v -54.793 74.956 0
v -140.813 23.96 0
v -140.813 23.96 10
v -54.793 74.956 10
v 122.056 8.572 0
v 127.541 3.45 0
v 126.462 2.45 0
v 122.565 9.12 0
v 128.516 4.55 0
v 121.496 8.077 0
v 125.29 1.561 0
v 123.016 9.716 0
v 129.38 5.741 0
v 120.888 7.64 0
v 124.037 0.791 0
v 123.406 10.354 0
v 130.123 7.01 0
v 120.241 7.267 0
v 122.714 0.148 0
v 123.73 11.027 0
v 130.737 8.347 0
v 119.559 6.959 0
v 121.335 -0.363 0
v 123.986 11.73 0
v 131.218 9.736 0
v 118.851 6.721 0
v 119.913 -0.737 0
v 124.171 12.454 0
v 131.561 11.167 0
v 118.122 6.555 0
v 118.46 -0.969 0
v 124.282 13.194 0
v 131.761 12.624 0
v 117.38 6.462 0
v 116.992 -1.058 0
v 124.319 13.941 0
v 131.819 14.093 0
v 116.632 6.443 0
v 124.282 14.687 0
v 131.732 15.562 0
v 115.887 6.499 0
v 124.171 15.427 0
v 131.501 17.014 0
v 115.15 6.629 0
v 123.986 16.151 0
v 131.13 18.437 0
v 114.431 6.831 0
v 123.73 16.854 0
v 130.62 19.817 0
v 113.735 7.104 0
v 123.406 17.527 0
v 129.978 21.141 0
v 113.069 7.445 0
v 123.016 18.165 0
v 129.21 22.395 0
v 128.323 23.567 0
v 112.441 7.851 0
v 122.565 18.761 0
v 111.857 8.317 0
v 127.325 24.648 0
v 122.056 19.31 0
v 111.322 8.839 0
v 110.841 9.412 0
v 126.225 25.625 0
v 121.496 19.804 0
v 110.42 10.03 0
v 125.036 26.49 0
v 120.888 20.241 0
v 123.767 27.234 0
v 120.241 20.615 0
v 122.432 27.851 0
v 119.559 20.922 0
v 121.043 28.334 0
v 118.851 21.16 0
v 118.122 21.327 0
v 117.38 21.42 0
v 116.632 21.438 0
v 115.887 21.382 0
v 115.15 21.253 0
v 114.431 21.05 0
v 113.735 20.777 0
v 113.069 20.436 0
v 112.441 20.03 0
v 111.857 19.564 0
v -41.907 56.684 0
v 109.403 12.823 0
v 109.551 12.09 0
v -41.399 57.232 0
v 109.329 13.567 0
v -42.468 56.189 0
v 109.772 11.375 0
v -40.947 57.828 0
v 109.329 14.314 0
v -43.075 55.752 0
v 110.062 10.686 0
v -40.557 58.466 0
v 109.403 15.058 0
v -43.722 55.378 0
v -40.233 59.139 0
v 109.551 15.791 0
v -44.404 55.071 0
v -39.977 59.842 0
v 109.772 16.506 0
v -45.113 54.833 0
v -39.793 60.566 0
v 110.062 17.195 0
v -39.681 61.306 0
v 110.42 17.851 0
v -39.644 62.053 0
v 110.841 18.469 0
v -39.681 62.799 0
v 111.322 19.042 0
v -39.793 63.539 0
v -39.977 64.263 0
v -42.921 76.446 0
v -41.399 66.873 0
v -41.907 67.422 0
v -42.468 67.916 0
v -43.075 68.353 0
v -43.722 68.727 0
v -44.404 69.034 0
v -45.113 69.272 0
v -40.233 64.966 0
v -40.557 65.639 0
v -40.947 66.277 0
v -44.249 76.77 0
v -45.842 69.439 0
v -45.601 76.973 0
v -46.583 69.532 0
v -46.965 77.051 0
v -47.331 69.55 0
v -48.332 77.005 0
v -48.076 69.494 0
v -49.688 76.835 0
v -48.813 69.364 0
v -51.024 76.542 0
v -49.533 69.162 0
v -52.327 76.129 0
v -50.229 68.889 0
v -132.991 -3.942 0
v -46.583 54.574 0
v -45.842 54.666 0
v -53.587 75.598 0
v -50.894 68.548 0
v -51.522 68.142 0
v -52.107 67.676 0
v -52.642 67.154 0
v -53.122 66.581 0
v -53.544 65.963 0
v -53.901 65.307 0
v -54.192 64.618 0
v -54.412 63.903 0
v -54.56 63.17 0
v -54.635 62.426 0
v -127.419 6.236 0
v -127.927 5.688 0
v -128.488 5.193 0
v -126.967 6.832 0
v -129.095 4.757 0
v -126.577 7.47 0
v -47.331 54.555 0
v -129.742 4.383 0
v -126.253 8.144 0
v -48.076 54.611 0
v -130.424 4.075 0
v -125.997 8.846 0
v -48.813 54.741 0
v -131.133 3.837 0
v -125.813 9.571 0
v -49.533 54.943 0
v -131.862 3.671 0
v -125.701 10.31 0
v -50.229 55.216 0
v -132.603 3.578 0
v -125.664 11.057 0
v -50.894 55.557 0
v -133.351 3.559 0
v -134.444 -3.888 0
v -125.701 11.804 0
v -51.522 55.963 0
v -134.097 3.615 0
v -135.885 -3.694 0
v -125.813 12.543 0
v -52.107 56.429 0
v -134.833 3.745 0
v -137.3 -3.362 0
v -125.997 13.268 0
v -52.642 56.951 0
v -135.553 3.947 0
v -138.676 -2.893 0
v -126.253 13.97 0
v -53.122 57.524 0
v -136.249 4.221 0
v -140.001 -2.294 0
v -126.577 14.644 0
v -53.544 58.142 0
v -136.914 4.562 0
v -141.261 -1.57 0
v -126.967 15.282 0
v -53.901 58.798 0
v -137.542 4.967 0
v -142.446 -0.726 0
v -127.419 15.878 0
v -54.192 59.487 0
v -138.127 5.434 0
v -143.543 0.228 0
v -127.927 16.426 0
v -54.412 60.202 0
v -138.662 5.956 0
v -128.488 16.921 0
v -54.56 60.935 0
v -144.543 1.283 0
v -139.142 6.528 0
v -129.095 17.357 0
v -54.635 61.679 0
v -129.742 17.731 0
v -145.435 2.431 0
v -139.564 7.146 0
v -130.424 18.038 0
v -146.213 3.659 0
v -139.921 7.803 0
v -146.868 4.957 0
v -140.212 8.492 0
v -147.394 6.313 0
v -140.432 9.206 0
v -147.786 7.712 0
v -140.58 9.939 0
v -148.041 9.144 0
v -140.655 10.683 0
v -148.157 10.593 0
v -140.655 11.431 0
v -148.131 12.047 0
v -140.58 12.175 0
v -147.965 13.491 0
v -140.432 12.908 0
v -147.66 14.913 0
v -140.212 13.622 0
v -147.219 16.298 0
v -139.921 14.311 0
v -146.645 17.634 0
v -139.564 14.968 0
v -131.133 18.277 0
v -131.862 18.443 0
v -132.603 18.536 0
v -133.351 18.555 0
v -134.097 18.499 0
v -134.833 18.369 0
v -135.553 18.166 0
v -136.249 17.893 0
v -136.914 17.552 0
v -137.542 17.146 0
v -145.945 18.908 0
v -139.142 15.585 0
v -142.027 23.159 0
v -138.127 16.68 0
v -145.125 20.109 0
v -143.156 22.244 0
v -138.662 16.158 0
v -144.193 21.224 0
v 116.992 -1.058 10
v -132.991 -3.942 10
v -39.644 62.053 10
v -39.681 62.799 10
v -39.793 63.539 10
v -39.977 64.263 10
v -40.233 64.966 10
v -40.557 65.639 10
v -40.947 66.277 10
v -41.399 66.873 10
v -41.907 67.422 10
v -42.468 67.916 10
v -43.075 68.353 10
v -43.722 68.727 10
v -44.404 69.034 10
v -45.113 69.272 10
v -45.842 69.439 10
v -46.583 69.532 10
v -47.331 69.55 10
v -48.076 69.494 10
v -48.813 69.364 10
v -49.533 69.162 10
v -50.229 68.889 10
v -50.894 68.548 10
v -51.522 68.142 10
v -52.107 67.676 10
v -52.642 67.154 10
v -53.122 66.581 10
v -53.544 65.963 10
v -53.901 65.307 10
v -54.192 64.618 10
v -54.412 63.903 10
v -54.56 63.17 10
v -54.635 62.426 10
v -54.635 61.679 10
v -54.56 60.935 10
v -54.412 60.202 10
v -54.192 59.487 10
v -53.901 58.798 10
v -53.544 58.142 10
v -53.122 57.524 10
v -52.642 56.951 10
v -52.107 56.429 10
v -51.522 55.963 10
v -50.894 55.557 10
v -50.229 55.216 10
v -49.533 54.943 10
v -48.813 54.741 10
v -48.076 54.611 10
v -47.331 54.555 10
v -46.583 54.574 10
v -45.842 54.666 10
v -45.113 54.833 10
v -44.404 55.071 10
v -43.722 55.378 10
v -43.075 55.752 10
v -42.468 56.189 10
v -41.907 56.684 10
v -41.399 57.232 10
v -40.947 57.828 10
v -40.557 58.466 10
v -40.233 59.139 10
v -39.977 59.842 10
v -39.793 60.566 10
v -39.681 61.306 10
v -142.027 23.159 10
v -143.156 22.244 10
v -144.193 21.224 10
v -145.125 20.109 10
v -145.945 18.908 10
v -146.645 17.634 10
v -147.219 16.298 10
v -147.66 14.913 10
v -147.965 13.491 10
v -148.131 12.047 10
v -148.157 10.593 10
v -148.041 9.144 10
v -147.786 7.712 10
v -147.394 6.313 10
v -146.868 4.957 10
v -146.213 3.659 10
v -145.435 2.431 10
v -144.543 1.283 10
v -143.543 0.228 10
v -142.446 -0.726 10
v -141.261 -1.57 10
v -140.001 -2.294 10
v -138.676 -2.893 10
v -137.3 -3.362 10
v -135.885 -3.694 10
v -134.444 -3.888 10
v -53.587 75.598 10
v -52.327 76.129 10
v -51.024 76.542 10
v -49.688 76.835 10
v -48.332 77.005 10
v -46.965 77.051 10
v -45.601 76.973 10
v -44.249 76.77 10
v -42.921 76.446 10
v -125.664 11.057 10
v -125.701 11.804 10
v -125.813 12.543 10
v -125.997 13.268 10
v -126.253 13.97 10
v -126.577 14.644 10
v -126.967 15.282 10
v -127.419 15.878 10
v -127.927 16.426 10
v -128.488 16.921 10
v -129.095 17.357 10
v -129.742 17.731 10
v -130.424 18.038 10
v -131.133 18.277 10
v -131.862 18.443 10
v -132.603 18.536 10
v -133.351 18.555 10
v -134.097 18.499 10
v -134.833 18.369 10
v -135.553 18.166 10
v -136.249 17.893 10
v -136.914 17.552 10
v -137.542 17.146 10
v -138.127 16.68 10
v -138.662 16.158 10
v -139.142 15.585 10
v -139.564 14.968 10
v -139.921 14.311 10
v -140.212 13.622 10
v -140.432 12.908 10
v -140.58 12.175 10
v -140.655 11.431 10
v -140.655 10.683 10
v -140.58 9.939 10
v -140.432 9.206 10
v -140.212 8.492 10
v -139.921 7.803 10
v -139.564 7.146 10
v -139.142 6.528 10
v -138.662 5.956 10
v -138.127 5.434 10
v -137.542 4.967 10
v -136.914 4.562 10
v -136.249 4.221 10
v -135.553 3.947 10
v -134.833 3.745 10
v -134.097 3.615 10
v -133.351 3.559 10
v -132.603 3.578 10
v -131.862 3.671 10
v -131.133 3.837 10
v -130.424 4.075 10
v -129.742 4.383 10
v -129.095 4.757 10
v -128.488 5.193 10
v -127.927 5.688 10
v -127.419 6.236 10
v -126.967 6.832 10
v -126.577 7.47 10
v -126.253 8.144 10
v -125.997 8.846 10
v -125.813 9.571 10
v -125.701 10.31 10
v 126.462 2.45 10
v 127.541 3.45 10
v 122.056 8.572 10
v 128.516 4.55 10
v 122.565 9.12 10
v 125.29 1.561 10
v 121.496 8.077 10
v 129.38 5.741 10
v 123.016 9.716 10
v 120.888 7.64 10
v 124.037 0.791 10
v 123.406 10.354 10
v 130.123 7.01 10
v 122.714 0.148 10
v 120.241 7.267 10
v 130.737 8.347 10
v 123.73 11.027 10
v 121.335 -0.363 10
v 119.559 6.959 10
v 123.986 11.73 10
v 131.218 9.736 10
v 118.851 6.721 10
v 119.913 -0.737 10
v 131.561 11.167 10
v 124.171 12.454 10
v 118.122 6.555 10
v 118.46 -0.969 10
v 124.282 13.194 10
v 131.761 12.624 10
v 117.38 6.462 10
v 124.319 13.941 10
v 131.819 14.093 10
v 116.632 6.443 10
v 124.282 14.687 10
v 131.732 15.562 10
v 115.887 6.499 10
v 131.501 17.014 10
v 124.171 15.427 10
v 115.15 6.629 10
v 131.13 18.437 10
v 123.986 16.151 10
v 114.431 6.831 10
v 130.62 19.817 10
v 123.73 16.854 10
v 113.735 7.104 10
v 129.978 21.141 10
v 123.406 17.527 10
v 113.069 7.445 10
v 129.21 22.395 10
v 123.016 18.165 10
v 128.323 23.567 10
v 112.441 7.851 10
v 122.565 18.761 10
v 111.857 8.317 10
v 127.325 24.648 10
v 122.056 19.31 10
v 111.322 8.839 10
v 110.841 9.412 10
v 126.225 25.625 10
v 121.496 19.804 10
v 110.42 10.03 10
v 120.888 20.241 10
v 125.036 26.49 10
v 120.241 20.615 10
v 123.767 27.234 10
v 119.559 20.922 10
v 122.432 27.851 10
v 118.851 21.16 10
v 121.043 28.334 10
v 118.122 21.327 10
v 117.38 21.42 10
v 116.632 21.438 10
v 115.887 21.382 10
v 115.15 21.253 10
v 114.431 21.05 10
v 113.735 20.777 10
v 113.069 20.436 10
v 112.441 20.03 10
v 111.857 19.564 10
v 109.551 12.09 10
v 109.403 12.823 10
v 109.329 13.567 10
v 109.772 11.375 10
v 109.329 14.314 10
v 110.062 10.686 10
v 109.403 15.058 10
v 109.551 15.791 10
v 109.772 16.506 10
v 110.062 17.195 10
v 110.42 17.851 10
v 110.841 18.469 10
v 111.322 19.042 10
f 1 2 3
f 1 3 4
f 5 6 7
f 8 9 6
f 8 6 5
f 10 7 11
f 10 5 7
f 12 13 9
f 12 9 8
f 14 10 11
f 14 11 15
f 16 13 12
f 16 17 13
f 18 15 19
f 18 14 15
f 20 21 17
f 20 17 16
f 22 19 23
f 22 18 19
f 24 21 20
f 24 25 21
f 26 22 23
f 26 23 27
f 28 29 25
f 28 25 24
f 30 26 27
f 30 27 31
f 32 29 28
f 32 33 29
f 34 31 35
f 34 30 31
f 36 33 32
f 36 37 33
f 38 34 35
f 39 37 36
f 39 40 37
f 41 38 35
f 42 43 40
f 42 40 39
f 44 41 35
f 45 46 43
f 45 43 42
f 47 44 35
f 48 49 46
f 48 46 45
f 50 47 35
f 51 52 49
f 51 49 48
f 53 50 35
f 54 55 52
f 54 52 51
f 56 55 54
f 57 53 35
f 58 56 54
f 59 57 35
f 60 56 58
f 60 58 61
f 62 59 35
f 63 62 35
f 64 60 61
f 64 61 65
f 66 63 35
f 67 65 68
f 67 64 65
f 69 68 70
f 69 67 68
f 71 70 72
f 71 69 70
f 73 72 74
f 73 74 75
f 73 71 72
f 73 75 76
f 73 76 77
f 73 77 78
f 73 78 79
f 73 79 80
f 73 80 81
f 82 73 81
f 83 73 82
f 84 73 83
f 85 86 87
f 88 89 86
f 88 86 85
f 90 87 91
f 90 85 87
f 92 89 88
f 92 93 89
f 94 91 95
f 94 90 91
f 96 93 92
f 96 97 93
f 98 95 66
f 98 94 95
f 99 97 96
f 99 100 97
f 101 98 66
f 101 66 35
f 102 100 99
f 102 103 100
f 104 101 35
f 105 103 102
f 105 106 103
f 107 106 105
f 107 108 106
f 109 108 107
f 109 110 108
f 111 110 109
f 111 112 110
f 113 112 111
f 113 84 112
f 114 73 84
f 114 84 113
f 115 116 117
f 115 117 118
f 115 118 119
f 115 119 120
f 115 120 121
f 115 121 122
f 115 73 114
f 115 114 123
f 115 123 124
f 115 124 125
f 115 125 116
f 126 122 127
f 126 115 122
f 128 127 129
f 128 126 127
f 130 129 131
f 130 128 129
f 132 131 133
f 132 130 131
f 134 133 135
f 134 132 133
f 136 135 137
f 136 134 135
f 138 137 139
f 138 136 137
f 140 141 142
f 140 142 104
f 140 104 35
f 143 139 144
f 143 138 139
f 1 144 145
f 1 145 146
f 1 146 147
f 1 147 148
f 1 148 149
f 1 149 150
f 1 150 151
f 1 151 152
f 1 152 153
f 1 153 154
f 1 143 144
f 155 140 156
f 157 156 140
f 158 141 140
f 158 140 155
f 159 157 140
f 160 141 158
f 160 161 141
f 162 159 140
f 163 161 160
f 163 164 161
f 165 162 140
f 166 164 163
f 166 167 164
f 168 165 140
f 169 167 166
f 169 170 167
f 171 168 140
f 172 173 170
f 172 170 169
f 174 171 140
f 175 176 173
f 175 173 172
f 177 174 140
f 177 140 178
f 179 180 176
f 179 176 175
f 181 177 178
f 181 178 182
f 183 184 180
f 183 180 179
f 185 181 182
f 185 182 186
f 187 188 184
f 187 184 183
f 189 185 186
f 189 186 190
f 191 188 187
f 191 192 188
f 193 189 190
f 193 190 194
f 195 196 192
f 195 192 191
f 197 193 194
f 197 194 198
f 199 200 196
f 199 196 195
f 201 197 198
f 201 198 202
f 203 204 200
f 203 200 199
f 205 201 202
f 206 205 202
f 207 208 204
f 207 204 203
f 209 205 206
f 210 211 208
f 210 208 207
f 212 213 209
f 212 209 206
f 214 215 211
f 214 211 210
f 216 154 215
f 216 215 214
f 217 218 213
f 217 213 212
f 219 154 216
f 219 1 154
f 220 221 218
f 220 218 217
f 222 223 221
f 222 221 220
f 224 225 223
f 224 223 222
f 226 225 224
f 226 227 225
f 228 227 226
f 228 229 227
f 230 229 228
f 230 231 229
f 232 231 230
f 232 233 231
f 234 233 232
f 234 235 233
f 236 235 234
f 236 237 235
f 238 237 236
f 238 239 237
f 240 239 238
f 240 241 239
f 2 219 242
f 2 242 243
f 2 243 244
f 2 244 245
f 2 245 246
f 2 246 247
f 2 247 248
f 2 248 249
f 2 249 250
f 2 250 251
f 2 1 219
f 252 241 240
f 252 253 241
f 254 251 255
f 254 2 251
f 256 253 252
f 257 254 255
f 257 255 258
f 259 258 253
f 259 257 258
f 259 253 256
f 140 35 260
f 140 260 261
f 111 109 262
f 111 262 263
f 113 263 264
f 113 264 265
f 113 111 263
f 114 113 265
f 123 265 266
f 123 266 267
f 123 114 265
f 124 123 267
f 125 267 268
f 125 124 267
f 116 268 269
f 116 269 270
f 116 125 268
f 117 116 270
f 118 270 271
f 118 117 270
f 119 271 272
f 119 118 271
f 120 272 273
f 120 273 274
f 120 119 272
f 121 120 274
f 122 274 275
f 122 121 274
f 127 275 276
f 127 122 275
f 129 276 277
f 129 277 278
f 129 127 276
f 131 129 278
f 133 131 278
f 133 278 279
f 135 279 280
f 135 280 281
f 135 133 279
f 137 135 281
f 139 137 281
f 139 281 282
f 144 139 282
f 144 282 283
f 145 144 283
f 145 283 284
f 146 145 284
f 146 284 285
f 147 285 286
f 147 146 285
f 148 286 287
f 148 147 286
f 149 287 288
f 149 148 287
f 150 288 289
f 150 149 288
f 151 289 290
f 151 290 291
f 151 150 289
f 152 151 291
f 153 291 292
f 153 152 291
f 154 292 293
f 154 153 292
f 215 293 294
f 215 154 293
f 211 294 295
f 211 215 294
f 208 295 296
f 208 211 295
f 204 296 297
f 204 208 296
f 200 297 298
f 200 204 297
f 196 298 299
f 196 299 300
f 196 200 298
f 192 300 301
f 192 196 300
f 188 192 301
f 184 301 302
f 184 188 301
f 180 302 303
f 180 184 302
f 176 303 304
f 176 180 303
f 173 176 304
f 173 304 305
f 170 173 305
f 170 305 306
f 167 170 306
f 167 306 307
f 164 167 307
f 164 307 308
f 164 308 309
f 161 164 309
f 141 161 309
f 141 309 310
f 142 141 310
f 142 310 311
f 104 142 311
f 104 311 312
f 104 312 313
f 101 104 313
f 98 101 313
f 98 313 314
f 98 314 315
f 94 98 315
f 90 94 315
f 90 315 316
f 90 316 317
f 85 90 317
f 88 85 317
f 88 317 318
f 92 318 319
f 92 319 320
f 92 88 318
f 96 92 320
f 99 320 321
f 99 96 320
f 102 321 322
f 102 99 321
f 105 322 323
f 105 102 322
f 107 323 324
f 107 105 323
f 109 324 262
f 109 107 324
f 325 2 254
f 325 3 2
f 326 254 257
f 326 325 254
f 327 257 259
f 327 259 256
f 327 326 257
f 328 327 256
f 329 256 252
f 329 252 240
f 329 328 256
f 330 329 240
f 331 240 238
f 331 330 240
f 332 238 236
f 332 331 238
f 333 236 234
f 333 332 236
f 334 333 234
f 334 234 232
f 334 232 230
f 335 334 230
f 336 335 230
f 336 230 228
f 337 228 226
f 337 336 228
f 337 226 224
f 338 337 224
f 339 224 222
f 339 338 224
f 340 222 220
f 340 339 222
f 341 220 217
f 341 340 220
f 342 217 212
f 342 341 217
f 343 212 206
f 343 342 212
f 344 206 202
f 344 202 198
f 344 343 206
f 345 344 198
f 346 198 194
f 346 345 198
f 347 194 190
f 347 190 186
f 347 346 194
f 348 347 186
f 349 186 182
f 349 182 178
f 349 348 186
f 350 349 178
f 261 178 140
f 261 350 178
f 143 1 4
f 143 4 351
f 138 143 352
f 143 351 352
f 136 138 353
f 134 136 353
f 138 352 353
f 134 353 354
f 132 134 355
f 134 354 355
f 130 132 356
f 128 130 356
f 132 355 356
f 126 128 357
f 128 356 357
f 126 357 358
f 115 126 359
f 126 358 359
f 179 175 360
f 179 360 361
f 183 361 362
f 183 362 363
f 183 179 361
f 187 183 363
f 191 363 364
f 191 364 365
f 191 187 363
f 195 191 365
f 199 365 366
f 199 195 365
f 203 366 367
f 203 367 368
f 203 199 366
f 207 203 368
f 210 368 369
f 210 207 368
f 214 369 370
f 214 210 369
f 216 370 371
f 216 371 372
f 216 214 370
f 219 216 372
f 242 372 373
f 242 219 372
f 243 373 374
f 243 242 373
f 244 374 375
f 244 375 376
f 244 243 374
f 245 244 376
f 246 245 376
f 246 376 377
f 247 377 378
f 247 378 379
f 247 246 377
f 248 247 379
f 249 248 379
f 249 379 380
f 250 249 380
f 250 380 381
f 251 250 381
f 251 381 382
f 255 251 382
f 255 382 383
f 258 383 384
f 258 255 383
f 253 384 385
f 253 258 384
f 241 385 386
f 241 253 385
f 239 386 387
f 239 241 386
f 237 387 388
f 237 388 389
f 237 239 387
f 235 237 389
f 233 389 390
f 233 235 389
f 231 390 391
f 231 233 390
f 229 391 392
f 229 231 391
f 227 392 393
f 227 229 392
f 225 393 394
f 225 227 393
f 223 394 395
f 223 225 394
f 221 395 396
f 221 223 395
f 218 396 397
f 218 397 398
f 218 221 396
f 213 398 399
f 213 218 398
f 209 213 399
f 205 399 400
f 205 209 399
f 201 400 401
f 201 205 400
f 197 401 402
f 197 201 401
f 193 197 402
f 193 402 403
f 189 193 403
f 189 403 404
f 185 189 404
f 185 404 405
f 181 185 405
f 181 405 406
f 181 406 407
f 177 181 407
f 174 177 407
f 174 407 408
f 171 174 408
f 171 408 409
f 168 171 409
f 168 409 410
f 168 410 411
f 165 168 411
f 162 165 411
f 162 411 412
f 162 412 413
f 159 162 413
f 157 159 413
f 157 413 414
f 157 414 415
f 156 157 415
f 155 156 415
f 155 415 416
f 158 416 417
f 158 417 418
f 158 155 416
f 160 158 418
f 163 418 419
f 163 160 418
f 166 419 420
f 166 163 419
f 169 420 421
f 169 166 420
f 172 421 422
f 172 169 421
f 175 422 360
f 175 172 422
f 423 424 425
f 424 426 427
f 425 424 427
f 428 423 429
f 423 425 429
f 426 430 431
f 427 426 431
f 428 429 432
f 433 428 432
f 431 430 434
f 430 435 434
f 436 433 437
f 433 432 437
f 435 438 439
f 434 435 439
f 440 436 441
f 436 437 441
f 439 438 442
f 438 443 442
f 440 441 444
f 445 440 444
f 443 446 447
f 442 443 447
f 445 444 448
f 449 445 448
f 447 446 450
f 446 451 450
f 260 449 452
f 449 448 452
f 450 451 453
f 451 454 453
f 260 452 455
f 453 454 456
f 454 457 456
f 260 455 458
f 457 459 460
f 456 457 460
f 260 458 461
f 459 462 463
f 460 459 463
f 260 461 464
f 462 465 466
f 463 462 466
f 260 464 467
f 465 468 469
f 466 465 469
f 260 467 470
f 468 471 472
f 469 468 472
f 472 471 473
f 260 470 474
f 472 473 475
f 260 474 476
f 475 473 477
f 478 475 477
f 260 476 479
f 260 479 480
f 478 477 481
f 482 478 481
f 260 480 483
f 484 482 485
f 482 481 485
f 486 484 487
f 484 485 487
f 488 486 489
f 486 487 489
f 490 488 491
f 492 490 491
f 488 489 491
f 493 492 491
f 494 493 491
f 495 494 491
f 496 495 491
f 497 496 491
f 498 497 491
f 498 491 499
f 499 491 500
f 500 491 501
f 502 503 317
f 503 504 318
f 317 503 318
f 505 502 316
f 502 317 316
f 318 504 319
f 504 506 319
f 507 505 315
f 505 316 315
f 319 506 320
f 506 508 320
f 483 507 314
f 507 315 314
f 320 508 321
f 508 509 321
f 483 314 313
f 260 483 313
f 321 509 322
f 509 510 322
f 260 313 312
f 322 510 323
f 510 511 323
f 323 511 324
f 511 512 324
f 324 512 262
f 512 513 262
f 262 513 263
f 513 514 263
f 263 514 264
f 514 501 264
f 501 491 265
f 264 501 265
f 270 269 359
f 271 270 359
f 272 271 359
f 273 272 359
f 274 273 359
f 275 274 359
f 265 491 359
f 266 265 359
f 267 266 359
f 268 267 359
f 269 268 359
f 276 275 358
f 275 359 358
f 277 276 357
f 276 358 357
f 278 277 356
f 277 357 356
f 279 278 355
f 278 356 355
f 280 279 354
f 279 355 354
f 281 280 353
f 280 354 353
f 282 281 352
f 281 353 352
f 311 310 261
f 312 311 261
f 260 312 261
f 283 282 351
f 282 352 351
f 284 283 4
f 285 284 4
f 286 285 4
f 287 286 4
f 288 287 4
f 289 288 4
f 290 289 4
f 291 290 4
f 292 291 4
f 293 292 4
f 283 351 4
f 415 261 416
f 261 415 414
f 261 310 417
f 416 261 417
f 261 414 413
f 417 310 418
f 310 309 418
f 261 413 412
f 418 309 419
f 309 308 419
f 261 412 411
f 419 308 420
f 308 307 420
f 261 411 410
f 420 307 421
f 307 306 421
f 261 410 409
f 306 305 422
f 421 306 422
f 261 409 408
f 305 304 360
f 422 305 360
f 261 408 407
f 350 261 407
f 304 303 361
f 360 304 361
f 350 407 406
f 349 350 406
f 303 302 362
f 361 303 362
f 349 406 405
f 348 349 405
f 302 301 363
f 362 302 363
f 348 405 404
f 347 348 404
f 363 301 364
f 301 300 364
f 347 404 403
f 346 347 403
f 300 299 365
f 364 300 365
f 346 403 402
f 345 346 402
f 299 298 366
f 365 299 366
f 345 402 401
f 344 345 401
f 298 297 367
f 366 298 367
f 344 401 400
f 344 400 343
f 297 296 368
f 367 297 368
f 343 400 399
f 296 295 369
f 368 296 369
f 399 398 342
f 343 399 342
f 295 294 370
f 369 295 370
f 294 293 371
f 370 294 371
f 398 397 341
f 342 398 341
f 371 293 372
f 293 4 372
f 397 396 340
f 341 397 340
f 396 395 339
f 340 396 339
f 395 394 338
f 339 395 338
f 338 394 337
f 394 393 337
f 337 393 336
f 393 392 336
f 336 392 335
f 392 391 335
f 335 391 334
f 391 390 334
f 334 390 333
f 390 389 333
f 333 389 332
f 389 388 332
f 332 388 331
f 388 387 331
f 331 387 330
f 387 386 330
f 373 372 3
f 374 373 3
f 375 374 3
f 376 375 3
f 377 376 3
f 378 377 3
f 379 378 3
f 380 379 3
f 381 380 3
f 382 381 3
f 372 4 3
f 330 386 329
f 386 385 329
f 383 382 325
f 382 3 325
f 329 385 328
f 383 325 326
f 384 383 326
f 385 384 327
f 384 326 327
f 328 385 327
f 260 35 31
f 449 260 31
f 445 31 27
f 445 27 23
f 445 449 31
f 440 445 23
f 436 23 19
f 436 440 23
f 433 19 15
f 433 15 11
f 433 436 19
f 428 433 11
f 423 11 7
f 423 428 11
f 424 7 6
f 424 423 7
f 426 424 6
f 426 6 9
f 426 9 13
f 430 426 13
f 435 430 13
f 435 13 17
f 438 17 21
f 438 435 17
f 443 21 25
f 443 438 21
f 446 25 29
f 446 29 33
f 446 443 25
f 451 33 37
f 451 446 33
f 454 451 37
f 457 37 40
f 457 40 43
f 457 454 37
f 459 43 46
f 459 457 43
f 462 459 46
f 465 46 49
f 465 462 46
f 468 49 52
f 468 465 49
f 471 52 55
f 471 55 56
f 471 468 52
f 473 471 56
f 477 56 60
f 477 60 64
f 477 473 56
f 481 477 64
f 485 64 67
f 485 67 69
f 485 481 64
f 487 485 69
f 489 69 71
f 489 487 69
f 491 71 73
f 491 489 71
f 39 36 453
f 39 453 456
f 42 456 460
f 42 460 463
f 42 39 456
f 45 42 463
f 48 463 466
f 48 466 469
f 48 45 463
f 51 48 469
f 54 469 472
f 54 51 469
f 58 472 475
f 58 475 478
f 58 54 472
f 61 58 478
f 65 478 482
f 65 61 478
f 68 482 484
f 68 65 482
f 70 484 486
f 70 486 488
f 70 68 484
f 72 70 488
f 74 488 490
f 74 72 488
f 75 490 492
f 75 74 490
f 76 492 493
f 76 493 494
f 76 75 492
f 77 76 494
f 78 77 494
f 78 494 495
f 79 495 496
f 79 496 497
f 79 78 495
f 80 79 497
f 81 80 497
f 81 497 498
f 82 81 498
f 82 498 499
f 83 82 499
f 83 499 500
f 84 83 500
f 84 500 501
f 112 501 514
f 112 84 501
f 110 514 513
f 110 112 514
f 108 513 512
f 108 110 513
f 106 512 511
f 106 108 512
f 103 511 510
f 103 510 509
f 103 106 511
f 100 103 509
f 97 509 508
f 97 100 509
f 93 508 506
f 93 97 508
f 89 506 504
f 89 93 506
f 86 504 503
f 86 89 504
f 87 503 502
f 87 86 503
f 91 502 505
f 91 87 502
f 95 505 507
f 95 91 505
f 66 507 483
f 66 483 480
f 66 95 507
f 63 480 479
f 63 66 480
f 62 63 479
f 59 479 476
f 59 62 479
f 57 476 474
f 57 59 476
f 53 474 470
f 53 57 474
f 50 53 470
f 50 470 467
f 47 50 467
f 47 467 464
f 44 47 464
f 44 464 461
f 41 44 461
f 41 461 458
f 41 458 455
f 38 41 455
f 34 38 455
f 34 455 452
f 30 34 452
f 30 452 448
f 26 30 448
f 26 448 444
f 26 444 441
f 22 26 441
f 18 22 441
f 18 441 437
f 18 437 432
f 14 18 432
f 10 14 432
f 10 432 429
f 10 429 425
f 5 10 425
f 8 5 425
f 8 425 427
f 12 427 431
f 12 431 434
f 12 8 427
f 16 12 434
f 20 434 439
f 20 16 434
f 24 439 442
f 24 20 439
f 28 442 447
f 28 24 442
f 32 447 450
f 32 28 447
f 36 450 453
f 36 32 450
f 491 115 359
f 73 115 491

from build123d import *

# Parameters (mm, degrees)
SKETCH2_R           = 7.5
BOSS_EXTRUDE1_DEPTH = 10
FILLET1_R           = 15
FILLET2_R           = 15
FILLET3_R           = 15


with BuildPart() as part:
    # Sketch2 → Boss-Extrude1 (new body)
    with BuildSketch(Plane.XY):
        Polygon((-188.967985521, -4.587781845), (-49.180964379, 78.282699744), (217.267895037, 0.098297427), align=None)
        with Locations((-133.163966534, 11.056935849)):
            Circle(SKETCH2_R, mode=Mode.SUBTRACT)
        with Locations((-47.143917344, 62.052535044)):
            Circle(SKETCH2_R, mode=Mode.SUBTRACT)
        with Locations((116.819402044, 13.94058532)):
            Circle(SKETCH2_R, mode=Mode.SUBTRACT)
    extrude(amount=BOSS_EXTRUDE1_DEPTH)

    # Fillet1
    fillet1_edges = [part.edges().sort_by_distance(p)[0] for p in [
        (217.267895037, 0.098297427, 5),
    ]]
    fillet(fillet1_edges, radius=FILLET1_R)

    # Fillet2
    fillet2_edges = [part.edges().sort_by_distance(p)[0] for p in [
        (-49.180964379, 78.282699744, 5),
    ]]
    fillet(fillet2_edges, radius=FILLET2_R)

    # Fillet3
    fillet3_edges = [part.edges().sort_by_distance(p)[0] for p in [
        (-188.967985521, -4.587781845, 5),
    ]]
    fillet(fillet3_edges, radius=FILLET3_R)


solid = part.part
